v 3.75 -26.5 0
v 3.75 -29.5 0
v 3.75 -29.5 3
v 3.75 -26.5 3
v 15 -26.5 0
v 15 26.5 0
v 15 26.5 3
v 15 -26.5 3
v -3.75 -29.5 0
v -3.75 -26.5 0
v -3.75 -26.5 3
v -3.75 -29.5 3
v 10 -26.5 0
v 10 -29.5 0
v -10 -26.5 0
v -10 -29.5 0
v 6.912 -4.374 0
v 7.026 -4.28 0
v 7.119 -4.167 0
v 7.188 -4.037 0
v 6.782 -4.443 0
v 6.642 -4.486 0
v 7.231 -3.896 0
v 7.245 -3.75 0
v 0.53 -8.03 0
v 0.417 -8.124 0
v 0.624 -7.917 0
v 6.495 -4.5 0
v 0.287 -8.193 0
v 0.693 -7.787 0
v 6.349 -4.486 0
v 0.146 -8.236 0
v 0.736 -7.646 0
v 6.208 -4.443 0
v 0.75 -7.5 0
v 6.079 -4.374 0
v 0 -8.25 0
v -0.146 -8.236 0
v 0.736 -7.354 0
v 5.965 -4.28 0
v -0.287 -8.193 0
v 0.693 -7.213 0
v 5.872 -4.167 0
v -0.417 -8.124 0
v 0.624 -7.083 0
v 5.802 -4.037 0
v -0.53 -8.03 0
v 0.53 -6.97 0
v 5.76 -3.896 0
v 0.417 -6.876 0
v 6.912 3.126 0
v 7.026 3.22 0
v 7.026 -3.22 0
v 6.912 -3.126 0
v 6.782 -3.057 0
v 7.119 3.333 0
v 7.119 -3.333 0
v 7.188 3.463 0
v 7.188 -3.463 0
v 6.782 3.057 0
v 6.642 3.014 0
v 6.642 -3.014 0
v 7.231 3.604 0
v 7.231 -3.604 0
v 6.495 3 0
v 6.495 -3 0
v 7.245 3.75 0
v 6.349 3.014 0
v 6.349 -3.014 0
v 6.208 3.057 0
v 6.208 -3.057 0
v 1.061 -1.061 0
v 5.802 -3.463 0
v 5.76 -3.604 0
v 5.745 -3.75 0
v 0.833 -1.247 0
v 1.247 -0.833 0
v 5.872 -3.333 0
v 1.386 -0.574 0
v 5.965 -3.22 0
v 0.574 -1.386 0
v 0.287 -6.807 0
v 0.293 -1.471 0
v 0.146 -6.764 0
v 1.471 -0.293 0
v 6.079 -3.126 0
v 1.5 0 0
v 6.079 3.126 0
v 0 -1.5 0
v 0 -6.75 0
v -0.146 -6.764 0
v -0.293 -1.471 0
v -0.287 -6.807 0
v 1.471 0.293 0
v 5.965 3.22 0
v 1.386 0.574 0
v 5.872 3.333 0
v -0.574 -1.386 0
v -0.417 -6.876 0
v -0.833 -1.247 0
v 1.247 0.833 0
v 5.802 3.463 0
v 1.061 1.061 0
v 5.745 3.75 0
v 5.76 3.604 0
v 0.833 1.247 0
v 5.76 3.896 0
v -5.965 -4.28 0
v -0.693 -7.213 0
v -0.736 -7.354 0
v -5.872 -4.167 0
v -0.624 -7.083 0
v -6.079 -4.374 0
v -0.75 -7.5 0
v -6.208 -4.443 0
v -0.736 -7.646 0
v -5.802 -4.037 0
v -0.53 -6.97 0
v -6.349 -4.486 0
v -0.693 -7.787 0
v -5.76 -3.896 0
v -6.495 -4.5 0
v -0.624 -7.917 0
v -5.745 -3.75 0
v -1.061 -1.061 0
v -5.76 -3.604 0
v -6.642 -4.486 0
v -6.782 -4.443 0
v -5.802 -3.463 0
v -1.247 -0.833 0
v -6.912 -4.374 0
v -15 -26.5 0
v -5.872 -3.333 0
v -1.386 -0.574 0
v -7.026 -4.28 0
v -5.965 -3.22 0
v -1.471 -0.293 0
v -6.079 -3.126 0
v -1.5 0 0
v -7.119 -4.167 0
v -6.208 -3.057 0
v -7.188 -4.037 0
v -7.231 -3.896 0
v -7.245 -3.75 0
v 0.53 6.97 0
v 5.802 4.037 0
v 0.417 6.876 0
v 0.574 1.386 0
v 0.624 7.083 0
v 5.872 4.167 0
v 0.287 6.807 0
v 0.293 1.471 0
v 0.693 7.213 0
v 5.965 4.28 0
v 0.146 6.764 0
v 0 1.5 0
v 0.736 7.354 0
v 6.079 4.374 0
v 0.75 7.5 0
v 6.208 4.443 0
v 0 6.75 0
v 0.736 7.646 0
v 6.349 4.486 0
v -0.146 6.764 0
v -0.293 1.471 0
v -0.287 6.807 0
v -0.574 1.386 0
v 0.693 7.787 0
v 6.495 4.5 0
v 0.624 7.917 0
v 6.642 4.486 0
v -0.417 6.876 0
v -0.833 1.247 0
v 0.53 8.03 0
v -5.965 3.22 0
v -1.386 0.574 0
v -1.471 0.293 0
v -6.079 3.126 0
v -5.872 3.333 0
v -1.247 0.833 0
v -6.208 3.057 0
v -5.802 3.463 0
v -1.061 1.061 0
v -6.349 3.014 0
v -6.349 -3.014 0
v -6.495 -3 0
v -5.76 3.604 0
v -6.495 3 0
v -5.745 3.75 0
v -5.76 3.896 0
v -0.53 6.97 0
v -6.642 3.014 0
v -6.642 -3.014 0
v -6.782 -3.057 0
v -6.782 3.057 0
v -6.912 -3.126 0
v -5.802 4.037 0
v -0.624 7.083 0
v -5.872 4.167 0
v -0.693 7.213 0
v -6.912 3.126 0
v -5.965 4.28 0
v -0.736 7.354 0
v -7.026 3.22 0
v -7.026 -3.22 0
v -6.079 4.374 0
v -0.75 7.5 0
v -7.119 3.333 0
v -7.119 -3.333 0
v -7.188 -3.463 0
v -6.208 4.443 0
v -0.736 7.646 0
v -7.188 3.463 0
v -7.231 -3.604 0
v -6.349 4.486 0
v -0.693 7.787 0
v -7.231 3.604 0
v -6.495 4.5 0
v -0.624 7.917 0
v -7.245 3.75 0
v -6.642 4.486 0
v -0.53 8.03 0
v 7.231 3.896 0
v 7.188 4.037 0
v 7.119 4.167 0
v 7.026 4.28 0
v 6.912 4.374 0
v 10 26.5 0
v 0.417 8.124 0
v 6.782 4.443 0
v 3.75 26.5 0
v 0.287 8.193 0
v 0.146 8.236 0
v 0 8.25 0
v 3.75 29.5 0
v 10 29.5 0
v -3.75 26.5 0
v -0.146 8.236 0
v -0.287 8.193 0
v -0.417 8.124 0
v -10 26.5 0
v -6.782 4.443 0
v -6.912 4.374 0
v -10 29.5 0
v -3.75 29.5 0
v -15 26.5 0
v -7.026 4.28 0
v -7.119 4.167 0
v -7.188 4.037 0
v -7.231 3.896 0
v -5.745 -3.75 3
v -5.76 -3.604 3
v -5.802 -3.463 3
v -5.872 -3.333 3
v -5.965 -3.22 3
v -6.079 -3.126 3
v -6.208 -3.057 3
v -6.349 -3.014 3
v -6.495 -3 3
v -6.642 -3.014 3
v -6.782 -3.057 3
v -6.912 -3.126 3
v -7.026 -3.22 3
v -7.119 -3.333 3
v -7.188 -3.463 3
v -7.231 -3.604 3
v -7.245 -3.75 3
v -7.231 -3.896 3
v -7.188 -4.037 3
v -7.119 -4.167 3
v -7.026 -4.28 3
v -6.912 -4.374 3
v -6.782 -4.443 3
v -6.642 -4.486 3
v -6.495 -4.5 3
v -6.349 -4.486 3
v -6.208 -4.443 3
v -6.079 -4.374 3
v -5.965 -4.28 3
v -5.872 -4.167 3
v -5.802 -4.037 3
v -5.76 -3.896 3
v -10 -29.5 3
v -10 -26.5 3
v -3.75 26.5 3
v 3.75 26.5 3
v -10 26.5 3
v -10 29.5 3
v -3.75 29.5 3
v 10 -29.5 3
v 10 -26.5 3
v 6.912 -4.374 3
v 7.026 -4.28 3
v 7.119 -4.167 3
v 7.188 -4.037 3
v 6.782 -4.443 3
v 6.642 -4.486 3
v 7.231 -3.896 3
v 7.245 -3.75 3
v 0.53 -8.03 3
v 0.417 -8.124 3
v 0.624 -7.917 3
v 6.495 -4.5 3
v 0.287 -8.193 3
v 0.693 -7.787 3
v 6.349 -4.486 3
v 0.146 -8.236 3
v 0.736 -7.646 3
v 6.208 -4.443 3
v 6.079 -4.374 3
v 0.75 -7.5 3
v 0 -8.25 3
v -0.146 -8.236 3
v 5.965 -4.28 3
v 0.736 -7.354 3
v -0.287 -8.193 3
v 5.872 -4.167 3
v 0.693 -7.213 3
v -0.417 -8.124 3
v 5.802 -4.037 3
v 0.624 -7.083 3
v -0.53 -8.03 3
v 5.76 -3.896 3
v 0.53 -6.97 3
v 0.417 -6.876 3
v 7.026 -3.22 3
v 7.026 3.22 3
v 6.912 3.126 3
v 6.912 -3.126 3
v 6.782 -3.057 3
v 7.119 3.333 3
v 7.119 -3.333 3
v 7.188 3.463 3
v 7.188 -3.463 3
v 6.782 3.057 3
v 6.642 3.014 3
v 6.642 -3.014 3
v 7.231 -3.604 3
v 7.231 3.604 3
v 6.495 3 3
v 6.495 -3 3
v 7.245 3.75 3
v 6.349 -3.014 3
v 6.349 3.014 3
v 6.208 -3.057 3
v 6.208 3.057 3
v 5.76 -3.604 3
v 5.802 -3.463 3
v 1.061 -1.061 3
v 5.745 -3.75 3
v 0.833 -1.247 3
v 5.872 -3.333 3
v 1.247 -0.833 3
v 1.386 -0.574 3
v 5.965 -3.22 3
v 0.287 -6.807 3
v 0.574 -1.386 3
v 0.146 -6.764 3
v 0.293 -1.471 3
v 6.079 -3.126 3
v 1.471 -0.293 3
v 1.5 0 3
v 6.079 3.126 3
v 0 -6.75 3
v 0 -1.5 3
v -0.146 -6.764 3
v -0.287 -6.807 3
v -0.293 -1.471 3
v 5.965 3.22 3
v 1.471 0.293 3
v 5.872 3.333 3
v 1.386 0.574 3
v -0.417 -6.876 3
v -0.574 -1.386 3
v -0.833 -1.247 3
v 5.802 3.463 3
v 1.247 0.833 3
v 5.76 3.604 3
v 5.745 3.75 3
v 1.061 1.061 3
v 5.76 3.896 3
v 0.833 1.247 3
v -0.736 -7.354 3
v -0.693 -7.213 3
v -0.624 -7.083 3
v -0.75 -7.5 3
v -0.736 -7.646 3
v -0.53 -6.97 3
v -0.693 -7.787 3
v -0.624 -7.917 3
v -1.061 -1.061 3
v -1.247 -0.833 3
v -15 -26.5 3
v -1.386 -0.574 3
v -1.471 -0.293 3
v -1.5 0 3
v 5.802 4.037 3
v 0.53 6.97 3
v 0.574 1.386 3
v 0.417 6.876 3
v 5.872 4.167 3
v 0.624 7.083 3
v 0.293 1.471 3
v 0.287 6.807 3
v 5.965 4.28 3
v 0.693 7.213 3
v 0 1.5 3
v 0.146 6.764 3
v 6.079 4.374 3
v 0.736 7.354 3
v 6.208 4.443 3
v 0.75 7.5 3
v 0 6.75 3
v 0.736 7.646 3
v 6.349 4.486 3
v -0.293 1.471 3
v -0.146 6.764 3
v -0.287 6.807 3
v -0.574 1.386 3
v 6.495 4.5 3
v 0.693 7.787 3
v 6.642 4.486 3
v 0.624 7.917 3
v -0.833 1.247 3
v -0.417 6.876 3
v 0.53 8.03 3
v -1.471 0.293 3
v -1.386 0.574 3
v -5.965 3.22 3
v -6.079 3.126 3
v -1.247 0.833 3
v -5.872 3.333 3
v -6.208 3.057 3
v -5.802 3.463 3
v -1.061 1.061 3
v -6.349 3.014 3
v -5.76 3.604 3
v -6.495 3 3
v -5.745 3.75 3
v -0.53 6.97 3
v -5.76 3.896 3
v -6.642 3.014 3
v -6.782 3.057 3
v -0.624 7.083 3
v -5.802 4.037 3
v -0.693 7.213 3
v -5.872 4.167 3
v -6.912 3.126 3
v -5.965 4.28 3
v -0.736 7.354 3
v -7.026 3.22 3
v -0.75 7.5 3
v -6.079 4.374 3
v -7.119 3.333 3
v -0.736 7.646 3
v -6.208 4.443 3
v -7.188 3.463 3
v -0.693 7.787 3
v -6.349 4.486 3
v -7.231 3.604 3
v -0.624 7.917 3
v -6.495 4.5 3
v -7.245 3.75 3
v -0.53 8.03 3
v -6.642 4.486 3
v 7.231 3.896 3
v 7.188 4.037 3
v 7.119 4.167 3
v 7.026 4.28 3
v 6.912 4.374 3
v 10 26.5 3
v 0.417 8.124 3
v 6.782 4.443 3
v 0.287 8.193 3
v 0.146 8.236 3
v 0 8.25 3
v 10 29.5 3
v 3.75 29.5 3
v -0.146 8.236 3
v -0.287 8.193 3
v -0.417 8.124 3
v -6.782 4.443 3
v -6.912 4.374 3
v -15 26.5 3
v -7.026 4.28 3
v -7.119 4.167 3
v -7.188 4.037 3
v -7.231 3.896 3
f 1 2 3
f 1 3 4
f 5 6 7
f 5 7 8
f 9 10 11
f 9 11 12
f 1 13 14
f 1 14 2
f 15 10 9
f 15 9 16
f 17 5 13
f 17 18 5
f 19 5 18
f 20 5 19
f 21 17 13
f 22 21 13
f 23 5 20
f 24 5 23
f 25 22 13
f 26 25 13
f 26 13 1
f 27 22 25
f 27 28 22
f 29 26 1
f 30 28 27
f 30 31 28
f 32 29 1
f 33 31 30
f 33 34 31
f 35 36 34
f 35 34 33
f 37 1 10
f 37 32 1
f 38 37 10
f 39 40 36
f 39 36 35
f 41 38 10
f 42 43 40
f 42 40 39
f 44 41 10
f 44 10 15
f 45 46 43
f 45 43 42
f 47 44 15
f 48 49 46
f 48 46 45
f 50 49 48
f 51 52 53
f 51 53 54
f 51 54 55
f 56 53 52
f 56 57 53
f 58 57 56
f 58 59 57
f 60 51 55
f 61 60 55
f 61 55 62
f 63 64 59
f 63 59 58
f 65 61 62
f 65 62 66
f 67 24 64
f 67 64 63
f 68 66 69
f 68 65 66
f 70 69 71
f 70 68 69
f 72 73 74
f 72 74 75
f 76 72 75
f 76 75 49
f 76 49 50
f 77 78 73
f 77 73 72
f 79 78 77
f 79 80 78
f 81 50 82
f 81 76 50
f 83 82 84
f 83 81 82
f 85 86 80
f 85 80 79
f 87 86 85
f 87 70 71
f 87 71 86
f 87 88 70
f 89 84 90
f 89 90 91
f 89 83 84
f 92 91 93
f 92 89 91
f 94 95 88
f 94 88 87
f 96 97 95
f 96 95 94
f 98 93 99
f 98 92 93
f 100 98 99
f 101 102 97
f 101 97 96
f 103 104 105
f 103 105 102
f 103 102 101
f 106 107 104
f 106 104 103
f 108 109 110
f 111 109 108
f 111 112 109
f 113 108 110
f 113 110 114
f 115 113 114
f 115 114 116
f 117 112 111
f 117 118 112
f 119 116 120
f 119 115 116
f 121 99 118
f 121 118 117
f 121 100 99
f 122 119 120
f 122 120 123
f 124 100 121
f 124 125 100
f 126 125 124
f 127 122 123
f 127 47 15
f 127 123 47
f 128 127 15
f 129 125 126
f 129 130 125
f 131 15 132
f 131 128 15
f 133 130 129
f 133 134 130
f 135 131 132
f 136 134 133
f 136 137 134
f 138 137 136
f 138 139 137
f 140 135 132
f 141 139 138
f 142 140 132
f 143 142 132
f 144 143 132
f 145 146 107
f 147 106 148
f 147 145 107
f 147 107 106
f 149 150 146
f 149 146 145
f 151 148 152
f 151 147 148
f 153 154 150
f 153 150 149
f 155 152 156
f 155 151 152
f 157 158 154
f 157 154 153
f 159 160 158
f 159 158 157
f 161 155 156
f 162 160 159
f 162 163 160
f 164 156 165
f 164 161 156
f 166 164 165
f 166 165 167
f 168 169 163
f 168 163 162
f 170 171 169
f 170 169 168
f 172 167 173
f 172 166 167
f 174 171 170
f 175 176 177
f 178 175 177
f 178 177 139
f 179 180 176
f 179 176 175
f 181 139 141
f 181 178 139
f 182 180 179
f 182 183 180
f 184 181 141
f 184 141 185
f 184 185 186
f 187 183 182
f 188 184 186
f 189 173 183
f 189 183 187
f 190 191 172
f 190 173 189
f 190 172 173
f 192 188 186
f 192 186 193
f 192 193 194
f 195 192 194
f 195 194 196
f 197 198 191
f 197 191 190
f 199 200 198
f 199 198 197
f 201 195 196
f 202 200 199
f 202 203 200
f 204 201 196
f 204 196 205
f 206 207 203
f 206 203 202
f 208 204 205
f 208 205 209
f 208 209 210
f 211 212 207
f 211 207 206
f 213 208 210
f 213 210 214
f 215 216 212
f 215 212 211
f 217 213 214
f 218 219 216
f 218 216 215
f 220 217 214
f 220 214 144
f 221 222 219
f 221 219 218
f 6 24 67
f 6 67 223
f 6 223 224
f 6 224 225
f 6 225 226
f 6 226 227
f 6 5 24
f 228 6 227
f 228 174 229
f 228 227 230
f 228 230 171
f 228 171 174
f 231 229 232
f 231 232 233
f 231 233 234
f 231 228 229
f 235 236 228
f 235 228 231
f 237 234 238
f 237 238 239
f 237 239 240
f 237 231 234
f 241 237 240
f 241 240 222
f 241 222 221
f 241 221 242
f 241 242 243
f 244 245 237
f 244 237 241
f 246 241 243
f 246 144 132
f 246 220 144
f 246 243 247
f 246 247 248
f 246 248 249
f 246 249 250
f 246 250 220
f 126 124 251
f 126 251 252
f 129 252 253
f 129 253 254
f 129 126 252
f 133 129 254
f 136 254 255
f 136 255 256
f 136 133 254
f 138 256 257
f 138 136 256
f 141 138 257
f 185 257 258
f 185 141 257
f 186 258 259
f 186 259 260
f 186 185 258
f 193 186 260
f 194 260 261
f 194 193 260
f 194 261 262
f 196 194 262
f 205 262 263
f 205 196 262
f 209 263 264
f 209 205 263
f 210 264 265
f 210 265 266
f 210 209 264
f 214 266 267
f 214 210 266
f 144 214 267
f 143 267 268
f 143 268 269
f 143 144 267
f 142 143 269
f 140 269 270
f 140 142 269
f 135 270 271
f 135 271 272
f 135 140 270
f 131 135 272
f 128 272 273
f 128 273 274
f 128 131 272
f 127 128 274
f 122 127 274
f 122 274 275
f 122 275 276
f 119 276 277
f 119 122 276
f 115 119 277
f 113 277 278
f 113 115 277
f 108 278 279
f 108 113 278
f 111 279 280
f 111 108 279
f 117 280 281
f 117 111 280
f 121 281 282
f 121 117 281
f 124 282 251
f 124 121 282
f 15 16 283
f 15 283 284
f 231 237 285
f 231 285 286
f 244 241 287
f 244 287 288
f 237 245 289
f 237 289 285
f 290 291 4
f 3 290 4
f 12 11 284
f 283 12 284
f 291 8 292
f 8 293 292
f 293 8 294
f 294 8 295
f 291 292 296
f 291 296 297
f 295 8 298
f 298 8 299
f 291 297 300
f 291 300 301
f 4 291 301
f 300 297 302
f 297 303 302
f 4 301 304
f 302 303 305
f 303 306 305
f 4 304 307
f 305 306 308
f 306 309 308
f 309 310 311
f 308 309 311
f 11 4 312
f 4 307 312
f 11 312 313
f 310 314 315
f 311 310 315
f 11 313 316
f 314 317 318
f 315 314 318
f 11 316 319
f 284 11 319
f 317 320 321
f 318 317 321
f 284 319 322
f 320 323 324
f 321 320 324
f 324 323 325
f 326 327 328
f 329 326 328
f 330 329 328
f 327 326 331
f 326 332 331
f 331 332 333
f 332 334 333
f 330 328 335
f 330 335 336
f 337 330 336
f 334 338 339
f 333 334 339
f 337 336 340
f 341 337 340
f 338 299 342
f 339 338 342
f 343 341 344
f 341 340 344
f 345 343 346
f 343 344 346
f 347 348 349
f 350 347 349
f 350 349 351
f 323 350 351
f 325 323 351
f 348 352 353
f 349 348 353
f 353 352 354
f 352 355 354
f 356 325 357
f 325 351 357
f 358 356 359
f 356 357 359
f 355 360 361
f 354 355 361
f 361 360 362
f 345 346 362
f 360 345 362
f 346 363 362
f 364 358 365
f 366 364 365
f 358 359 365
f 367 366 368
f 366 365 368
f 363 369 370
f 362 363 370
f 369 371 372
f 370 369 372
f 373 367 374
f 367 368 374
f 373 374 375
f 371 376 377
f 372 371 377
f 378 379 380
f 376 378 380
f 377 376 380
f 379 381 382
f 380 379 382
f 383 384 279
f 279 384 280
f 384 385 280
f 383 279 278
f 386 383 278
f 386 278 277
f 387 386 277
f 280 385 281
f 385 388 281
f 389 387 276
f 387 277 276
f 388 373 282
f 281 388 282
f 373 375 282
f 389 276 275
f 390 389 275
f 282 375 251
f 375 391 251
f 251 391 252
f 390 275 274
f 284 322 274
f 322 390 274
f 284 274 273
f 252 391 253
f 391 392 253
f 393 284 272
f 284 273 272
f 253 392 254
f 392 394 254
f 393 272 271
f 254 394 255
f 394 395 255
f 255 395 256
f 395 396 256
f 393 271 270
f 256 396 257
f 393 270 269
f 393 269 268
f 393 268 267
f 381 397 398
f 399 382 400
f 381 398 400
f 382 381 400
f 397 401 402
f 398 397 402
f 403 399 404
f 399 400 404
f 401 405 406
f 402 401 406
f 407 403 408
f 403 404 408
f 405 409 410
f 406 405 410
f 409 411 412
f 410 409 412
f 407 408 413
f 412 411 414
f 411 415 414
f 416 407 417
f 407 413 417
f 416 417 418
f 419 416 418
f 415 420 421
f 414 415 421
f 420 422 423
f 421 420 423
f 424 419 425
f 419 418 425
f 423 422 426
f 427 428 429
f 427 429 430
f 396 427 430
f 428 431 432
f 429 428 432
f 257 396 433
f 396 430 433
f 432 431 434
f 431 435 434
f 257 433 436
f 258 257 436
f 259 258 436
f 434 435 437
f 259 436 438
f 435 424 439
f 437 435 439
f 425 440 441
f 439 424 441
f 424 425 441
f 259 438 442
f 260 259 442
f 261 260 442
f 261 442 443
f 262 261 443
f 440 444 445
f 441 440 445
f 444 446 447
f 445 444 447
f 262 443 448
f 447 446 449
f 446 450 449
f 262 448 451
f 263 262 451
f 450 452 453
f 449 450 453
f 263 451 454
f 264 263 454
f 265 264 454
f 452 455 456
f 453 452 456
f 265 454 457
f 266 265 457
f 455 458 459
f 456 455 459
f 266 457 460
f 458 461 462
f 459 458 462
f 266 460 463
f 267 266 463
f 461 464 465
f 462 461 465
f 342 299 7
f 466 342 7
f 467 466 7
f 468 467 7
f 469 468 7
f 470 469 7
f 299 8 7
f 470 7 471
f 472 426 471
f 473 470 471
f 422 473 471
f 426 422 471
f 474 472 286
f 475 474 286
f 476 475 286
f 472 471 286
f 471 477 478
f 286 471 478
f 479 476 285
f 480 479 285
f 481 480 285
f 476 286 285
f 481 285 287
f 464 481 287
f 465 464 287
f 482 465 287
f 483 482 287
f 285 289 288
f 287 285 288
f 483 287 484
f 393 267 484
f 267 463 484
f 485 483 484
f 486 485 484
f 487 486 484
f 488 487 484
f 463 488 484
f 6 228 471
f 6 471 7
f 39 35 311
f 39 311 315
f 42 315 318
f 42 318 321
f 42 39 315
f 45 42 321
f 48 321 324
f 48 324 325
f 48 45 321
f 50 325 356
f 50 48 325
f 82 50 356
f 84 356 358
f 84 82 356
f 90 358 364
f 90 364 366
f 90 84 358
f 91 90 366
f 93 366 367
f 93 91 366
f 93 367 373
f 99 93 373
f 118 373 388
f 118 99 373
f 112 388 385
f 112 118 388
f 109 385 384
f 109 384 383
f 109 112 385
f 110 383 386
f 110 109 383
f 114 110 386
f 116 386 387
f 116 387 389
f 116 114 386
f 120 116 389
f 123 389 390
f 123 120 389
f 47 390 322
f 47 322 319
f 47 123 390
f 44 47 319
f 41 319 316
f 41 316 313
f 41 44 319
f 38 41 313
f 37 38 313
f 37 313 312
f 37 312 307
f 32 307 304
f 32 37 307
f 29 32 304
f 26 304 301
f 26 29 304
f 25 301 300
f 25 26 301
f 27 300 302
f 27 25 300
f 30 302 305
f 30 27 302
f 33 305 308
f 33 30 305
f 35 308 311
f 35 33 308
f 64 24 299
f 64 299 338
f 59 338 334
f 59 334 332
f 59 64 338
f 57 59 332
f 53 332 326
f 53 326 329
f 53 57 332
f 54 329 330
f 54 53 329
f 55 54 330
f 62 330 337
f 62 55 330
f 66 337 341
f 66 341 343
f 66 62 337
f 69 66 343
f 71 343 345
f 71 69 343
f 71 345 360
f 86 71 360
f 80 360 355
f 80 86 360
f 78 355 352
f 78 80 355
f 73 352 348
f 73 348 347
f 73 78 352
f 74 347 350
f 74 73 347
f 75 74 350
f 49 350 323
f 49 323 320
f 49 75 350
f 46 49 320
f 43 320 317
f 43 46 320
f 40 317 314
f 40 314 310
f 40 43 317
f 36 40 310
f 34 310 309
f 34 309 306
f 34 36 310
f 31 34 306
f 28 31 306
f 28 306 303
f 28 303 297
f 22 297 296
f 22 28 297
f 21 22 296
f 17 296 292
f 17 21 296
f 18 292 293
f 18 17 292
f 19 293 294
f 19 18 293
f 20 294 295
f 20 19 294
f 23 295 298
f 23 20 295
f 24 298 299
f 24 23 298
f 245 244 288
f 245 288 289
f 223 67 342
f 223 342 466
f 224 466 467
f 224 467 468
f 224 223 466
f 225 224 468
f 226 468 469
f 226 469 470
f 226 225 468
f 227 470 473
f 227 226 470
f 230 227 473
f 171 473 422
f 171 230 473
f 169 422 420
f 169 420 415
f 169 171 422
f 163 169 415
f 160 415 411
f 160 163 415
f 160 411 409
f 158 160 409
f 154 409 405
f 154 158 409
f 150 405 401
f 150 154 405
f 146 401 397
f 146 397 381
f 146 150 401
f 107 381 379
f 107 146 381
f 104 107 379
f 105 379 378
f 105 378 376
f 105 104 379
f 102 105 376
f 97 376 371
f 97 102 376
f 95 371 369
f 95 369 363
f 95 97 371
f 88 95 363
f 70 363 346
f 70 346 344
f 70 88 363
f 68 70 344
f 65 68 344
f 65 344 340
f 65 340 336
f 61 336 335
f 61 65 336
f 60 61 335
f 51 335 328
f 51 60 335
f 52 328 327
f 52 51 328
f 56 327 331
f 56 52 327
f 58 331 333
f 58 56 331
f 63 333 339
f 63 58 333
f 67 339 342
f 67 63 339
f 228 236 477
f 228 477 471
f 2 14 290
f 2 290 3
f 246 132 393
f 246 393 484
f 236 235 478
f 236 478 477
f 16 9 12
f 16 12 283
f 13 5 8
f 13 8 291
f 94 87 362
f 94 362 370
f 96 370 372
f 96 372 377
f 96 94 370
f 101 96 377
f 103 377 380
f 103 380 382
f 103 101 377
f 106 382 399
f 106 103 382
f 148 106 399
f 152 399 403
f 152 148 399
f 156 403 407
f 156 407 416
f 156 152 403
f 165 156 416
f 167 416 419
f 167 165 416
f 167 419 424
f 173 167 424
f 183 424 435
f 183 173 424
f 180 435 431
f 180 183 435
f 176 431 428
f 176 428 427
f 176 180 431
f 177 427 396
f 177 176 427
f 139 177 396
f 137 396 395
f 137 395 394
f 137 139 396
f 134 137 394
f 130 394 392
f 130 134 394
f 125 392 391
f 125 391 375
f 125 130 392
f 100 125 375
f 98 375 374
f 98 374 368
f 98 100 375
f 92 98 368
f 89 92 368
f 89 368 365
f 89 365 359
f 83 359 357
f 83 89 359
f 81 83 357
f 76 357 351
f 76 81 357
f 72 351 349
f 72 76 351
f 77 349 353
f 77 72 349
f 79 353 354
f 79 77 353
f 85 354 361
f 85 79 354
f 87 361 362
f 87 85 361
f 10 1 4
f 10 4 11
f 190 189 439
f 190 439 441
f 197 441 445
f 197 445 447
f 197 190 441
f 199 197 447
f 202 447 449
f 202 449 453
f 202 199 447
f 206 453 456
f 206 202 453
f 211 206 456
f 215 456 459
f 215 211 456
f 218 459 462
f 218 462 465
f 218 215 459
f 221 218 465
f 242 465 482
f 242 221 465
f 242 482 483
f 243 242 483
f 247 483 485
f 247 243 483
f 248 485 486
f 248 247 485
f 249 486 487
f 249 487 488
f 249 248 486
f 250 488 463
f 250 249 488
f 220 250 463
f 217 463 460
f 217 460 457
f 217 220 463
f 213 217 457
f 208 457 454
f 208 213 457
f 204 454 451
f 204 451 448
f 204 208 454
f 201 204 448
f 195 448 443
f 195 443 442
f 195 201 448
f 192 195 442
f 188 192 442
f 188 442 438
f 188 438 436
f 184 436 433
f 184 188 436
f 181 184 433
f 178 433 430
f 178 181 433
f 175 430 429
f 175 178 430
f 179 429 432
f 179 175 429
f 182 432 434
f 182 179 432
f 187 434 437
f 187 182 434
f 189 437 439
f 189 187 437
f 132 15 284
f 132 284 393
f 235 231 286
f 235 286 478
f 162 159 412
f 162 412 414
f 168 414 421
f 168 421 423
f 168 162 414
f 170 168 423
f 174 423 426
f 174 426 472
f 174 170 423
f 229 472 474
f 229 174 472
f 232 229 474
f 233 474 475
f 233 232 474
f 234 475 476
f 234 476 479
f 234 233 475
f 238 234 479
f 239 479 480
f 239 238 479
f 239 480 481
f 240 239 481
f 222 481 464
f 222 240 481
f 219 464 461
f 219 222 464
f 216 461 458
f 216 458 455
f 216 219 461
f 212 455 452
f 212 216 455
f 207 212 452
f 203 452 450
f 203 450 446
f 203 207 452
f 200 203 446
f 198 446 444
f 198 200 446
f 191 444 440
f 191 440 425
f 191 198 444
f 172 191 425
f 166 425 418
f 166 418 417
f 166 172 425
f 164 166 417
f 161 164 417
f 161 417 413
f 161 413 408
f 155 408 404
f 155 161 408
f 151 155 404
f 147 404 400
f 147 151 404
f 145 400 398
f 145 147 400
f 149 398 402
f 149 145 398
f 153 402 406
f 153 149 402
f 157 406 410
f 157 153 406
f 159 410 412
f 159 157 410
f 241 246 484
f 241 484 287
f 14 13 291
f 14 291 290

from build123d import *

# Parameters (mm, degrees)
SKETCH1_R           = 0.75
SKETCH1_R_2         = 1.5
BOSS_EXTRUDE1_DEPTH = 3


with BuildPart() as part:
    # Sketch1 → Boss-Extrude1 (new body)
    with BuildSketch(Plane.XY):
        Polygon((-15, 26.5), (-10, 26.5), (-10, 29.5), (-3.75, 29.5), (-3.75, 26.5), (3.75, 26.5), (3.75, 29.5), (10, 29.5), (10, 26.5), (15, 26.5), (15, -26.5), (10, -26.5), (10, -29.5), (3.75, -29.5), (3.75, -26.5), (-3.75, -26.5), (-3.75, -29.5), (-10, -29.5), (-10, -26.5), (-15, -26.5), align=None)
        with Locations((0, 7.5)):
            Circle(SKETCH1_R, mode=Mode.SUBTRACT)
        with Locations((6.495190528, 3.75)):
            Circle(SKETCH1_R, mode=Mode.SUBTRACT)
        with Locations((6.495190528, -3.75)):
            Circle(SKETCH1_R, mode=Mode.SUBTRACT)
        with Locations((0, -7.5)):
            Circle(SKETCH1_R, mode=Mode.SUBTRACT)
        with Locations((-6.495190528, -3.75)):
            Circle(SKETCH1_R, mode=Mode.SUBTRACT)
        with Locations((-6.495190528, 3.75)):
            Circle(SKETCH1_R, mode=Mode.SUBTRACT)
        Circle(SKETCH1_R_2, mode=Mode.SUBTRACT)
    extrude(amount=BOSS_EXTRUDE1_DEPTH)


solid = part.part
